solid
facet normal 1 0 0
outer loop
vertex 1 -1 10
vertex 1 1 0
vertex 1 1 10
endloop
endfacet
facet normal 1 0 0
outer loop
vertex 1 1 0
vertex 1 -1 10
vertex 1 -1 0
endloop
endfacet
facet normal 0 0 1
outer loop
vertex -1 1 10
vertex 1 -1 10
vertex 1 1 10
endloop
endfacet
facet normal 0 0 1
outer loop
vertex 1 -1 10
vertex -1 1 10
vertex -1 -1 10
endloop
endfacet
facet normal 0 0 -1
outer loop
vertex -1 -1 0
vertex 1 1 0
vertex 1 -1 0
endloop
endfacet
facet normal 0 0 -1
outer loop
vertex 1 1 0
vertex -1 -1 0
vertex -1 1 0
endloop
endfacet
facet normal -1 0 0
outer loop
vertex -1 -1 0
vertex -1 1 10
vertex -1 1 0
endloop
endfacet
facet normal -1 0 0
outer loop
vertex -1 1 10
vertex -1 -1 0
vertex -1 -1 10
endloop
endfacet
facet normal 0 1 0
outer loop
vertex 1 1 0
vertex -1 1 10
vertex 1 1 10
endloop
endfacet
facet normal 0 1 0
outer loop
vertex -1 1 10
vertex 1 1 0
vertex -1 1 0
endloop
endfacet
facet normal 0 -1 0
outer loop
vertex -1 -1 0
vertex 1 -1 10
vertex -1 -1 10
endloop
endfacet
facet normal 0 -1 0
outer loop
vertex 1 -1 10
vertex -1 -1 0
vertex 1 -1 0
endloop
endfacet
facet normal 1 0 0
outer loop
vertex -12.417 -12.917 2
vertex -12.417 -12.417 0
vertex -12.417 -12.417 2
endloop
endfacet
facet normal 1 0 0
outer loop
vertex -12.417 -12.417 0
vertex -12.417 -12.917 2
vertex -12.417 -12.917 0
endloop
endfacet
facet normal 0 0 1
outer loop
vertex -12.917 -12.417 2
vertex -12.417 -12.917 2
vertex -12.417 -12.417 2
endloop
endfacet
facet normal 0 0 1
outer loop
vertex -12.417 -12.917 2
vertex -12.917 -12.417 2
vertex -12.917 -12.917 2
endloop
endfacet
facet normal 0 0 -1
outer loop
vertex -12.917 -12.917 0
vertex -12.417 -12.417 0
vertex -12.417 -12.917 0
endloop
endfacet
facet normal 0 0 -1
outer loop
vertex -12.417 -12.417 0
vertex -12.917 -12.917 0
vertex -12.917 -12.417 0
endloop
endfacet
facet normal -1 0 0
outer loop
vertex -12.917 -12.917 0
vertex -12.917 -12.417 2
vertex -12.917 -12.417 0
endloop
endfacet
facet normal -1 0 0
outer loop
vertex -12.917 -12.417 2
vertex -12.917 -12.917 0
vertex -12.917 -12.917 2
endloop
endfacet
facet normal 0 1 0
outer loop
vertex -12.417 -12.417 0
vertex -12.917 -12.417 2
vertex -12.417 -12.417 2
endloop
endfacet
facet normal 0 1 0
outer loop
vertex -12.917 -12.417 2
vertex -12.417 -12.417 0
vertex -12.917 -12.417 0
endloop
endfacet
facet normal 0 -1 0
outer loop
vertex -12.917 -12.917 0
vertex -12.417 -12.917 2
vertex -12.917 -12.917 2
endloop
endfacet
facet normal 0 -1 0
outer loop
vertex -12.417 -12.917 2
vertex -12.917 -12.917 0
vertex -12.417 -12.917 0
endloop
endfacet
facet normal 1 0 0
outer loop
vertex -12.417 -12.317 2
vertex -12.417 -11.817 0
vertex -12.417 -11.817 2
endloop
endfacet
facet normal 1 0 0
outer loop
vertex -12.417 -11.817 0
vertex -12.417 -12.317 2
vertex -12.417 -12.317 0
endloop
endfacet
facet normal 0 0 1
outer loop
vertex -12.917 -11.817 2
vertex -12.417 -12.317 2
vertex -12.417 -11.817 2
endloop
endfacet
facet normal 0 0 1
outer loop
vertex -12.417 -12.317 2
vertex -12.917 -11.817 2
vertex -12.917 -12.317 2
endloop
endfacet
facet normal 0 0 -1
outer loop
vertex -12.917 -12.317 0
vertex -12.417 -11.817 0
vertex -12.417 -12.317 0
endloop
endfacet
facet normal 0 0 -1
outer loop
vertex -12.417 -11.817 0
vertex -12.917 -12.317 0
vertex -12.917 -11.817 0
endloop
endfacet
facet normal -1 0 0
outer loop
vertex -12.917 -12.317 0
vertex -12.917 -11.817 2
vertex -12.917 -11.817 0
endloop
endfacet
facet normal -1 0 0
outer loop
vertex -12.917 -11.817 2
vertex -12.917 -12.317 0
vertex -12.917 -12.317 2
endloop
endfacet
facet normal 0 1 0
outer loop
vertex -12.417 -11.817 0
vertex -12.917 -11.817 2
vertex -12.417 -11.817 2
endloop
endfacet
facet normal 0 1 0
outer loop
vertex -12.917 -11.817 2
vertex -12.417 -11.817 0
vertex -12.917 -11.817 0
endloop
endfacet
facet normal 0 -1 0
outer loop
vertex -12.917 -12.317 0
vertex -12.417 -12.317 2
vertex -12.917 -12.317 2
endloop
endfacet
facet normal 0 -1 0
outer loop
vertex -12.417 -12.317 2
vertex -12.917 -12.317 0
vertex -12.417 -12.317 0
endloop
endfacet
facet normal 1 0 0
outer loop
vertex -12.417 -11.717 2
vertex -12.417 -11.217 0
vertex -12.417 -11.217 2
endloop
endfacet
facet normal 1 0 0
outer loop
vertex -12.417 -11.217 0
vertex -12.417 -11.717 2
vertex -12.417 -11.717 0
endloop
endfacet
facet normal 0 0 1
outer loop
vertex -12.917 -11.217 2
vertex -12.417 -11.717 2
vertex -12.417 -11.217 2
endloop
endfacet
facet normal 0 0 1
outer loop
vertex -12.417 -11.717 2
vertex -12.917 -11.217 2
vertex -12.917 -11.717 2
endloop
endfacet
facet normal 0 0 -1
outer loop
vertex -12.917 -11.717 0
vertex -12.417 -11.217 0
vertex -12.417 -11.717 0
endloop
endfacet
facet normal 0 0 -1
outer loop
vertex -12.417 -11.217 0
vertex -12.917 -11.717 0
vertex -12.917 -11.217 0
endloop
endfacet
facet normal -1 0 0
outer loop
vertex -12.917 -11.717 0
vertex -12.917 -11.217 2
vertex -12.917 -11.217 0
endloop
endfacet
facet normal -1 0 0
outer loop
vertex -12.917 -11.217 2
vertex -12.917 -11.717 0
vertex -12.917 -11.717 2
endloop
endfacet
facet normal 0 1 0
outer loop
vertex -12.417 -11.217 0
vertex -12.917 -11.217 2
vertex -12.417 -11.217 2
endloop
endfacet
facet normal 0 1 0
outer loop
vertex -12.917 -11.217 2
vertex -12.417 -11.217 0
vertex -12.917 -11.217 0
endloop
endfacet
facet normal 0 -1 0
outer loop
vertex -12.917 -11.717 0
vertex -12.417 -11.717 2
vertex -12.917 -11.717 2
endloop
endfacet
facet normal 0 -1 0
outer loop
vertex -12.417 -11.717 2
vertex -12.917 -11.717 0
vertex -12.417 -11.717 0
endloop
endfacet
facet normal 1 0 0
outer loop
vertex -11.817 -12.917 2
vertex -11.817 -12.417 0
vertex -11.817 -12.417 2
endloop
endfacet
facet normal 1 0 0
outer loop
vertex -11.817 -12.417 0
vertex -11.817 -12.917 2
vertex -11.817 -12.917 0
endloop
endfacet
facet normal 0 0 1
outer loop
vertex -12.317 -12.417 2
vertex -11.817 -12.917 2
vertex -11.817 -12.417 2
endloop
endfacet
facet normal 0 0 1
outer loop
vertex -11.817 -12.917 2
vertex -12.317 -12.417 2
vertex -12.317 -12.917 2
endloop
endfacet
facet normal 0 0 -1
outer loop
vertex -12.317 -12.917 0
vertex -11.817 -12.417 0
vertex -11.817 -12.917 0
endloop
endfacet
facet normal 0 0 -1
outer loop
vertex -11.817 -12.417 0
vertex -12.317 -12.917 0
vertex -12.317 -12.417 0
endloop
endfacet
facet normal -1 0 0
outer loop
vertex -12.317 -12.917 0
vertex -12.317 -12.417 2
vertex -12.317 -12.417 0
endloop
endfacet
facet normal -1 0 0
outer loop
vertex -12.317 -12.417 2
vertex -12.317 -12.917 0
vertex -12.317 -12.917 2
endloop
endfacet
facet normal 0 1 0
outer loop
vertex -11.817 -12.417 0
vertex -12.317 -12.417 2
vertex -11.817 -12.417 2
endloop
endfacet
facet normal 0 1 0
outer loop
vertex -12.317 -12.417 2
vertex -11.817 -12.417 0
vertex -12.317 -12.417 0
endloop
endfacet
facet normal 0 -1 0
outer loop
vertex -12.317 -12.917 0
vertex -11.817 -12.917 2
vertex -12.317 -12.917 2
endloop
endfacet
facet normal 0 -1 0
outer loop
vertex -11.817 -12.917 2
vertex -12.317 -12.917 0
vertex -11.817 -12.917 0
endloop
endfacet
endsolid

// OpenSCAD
translate([0, 0, 5]) color([0,1,0,0.9]) cube([2, 2, 10], center=true);
translate([-12.666666666666666, -12.666666666666666, 1]) color([1,0,0]) cube([0.5, 0.5, 2], center=true);
translate([-12.666666666666666, -12.066666666666666, 1]) color([1,0,0]) cube([0.5, 0.5, 2], center=true);
translate([-12.666666666666666, -11.466666666666667, 1]) color([1,0,0]) cube([0.5, 0.5, 2], center=true);
translate([-12.066666666666666, -12.666666666666666, 1]) color([1,0,0]) cube([0.5, 0.5, 2], center=true);
